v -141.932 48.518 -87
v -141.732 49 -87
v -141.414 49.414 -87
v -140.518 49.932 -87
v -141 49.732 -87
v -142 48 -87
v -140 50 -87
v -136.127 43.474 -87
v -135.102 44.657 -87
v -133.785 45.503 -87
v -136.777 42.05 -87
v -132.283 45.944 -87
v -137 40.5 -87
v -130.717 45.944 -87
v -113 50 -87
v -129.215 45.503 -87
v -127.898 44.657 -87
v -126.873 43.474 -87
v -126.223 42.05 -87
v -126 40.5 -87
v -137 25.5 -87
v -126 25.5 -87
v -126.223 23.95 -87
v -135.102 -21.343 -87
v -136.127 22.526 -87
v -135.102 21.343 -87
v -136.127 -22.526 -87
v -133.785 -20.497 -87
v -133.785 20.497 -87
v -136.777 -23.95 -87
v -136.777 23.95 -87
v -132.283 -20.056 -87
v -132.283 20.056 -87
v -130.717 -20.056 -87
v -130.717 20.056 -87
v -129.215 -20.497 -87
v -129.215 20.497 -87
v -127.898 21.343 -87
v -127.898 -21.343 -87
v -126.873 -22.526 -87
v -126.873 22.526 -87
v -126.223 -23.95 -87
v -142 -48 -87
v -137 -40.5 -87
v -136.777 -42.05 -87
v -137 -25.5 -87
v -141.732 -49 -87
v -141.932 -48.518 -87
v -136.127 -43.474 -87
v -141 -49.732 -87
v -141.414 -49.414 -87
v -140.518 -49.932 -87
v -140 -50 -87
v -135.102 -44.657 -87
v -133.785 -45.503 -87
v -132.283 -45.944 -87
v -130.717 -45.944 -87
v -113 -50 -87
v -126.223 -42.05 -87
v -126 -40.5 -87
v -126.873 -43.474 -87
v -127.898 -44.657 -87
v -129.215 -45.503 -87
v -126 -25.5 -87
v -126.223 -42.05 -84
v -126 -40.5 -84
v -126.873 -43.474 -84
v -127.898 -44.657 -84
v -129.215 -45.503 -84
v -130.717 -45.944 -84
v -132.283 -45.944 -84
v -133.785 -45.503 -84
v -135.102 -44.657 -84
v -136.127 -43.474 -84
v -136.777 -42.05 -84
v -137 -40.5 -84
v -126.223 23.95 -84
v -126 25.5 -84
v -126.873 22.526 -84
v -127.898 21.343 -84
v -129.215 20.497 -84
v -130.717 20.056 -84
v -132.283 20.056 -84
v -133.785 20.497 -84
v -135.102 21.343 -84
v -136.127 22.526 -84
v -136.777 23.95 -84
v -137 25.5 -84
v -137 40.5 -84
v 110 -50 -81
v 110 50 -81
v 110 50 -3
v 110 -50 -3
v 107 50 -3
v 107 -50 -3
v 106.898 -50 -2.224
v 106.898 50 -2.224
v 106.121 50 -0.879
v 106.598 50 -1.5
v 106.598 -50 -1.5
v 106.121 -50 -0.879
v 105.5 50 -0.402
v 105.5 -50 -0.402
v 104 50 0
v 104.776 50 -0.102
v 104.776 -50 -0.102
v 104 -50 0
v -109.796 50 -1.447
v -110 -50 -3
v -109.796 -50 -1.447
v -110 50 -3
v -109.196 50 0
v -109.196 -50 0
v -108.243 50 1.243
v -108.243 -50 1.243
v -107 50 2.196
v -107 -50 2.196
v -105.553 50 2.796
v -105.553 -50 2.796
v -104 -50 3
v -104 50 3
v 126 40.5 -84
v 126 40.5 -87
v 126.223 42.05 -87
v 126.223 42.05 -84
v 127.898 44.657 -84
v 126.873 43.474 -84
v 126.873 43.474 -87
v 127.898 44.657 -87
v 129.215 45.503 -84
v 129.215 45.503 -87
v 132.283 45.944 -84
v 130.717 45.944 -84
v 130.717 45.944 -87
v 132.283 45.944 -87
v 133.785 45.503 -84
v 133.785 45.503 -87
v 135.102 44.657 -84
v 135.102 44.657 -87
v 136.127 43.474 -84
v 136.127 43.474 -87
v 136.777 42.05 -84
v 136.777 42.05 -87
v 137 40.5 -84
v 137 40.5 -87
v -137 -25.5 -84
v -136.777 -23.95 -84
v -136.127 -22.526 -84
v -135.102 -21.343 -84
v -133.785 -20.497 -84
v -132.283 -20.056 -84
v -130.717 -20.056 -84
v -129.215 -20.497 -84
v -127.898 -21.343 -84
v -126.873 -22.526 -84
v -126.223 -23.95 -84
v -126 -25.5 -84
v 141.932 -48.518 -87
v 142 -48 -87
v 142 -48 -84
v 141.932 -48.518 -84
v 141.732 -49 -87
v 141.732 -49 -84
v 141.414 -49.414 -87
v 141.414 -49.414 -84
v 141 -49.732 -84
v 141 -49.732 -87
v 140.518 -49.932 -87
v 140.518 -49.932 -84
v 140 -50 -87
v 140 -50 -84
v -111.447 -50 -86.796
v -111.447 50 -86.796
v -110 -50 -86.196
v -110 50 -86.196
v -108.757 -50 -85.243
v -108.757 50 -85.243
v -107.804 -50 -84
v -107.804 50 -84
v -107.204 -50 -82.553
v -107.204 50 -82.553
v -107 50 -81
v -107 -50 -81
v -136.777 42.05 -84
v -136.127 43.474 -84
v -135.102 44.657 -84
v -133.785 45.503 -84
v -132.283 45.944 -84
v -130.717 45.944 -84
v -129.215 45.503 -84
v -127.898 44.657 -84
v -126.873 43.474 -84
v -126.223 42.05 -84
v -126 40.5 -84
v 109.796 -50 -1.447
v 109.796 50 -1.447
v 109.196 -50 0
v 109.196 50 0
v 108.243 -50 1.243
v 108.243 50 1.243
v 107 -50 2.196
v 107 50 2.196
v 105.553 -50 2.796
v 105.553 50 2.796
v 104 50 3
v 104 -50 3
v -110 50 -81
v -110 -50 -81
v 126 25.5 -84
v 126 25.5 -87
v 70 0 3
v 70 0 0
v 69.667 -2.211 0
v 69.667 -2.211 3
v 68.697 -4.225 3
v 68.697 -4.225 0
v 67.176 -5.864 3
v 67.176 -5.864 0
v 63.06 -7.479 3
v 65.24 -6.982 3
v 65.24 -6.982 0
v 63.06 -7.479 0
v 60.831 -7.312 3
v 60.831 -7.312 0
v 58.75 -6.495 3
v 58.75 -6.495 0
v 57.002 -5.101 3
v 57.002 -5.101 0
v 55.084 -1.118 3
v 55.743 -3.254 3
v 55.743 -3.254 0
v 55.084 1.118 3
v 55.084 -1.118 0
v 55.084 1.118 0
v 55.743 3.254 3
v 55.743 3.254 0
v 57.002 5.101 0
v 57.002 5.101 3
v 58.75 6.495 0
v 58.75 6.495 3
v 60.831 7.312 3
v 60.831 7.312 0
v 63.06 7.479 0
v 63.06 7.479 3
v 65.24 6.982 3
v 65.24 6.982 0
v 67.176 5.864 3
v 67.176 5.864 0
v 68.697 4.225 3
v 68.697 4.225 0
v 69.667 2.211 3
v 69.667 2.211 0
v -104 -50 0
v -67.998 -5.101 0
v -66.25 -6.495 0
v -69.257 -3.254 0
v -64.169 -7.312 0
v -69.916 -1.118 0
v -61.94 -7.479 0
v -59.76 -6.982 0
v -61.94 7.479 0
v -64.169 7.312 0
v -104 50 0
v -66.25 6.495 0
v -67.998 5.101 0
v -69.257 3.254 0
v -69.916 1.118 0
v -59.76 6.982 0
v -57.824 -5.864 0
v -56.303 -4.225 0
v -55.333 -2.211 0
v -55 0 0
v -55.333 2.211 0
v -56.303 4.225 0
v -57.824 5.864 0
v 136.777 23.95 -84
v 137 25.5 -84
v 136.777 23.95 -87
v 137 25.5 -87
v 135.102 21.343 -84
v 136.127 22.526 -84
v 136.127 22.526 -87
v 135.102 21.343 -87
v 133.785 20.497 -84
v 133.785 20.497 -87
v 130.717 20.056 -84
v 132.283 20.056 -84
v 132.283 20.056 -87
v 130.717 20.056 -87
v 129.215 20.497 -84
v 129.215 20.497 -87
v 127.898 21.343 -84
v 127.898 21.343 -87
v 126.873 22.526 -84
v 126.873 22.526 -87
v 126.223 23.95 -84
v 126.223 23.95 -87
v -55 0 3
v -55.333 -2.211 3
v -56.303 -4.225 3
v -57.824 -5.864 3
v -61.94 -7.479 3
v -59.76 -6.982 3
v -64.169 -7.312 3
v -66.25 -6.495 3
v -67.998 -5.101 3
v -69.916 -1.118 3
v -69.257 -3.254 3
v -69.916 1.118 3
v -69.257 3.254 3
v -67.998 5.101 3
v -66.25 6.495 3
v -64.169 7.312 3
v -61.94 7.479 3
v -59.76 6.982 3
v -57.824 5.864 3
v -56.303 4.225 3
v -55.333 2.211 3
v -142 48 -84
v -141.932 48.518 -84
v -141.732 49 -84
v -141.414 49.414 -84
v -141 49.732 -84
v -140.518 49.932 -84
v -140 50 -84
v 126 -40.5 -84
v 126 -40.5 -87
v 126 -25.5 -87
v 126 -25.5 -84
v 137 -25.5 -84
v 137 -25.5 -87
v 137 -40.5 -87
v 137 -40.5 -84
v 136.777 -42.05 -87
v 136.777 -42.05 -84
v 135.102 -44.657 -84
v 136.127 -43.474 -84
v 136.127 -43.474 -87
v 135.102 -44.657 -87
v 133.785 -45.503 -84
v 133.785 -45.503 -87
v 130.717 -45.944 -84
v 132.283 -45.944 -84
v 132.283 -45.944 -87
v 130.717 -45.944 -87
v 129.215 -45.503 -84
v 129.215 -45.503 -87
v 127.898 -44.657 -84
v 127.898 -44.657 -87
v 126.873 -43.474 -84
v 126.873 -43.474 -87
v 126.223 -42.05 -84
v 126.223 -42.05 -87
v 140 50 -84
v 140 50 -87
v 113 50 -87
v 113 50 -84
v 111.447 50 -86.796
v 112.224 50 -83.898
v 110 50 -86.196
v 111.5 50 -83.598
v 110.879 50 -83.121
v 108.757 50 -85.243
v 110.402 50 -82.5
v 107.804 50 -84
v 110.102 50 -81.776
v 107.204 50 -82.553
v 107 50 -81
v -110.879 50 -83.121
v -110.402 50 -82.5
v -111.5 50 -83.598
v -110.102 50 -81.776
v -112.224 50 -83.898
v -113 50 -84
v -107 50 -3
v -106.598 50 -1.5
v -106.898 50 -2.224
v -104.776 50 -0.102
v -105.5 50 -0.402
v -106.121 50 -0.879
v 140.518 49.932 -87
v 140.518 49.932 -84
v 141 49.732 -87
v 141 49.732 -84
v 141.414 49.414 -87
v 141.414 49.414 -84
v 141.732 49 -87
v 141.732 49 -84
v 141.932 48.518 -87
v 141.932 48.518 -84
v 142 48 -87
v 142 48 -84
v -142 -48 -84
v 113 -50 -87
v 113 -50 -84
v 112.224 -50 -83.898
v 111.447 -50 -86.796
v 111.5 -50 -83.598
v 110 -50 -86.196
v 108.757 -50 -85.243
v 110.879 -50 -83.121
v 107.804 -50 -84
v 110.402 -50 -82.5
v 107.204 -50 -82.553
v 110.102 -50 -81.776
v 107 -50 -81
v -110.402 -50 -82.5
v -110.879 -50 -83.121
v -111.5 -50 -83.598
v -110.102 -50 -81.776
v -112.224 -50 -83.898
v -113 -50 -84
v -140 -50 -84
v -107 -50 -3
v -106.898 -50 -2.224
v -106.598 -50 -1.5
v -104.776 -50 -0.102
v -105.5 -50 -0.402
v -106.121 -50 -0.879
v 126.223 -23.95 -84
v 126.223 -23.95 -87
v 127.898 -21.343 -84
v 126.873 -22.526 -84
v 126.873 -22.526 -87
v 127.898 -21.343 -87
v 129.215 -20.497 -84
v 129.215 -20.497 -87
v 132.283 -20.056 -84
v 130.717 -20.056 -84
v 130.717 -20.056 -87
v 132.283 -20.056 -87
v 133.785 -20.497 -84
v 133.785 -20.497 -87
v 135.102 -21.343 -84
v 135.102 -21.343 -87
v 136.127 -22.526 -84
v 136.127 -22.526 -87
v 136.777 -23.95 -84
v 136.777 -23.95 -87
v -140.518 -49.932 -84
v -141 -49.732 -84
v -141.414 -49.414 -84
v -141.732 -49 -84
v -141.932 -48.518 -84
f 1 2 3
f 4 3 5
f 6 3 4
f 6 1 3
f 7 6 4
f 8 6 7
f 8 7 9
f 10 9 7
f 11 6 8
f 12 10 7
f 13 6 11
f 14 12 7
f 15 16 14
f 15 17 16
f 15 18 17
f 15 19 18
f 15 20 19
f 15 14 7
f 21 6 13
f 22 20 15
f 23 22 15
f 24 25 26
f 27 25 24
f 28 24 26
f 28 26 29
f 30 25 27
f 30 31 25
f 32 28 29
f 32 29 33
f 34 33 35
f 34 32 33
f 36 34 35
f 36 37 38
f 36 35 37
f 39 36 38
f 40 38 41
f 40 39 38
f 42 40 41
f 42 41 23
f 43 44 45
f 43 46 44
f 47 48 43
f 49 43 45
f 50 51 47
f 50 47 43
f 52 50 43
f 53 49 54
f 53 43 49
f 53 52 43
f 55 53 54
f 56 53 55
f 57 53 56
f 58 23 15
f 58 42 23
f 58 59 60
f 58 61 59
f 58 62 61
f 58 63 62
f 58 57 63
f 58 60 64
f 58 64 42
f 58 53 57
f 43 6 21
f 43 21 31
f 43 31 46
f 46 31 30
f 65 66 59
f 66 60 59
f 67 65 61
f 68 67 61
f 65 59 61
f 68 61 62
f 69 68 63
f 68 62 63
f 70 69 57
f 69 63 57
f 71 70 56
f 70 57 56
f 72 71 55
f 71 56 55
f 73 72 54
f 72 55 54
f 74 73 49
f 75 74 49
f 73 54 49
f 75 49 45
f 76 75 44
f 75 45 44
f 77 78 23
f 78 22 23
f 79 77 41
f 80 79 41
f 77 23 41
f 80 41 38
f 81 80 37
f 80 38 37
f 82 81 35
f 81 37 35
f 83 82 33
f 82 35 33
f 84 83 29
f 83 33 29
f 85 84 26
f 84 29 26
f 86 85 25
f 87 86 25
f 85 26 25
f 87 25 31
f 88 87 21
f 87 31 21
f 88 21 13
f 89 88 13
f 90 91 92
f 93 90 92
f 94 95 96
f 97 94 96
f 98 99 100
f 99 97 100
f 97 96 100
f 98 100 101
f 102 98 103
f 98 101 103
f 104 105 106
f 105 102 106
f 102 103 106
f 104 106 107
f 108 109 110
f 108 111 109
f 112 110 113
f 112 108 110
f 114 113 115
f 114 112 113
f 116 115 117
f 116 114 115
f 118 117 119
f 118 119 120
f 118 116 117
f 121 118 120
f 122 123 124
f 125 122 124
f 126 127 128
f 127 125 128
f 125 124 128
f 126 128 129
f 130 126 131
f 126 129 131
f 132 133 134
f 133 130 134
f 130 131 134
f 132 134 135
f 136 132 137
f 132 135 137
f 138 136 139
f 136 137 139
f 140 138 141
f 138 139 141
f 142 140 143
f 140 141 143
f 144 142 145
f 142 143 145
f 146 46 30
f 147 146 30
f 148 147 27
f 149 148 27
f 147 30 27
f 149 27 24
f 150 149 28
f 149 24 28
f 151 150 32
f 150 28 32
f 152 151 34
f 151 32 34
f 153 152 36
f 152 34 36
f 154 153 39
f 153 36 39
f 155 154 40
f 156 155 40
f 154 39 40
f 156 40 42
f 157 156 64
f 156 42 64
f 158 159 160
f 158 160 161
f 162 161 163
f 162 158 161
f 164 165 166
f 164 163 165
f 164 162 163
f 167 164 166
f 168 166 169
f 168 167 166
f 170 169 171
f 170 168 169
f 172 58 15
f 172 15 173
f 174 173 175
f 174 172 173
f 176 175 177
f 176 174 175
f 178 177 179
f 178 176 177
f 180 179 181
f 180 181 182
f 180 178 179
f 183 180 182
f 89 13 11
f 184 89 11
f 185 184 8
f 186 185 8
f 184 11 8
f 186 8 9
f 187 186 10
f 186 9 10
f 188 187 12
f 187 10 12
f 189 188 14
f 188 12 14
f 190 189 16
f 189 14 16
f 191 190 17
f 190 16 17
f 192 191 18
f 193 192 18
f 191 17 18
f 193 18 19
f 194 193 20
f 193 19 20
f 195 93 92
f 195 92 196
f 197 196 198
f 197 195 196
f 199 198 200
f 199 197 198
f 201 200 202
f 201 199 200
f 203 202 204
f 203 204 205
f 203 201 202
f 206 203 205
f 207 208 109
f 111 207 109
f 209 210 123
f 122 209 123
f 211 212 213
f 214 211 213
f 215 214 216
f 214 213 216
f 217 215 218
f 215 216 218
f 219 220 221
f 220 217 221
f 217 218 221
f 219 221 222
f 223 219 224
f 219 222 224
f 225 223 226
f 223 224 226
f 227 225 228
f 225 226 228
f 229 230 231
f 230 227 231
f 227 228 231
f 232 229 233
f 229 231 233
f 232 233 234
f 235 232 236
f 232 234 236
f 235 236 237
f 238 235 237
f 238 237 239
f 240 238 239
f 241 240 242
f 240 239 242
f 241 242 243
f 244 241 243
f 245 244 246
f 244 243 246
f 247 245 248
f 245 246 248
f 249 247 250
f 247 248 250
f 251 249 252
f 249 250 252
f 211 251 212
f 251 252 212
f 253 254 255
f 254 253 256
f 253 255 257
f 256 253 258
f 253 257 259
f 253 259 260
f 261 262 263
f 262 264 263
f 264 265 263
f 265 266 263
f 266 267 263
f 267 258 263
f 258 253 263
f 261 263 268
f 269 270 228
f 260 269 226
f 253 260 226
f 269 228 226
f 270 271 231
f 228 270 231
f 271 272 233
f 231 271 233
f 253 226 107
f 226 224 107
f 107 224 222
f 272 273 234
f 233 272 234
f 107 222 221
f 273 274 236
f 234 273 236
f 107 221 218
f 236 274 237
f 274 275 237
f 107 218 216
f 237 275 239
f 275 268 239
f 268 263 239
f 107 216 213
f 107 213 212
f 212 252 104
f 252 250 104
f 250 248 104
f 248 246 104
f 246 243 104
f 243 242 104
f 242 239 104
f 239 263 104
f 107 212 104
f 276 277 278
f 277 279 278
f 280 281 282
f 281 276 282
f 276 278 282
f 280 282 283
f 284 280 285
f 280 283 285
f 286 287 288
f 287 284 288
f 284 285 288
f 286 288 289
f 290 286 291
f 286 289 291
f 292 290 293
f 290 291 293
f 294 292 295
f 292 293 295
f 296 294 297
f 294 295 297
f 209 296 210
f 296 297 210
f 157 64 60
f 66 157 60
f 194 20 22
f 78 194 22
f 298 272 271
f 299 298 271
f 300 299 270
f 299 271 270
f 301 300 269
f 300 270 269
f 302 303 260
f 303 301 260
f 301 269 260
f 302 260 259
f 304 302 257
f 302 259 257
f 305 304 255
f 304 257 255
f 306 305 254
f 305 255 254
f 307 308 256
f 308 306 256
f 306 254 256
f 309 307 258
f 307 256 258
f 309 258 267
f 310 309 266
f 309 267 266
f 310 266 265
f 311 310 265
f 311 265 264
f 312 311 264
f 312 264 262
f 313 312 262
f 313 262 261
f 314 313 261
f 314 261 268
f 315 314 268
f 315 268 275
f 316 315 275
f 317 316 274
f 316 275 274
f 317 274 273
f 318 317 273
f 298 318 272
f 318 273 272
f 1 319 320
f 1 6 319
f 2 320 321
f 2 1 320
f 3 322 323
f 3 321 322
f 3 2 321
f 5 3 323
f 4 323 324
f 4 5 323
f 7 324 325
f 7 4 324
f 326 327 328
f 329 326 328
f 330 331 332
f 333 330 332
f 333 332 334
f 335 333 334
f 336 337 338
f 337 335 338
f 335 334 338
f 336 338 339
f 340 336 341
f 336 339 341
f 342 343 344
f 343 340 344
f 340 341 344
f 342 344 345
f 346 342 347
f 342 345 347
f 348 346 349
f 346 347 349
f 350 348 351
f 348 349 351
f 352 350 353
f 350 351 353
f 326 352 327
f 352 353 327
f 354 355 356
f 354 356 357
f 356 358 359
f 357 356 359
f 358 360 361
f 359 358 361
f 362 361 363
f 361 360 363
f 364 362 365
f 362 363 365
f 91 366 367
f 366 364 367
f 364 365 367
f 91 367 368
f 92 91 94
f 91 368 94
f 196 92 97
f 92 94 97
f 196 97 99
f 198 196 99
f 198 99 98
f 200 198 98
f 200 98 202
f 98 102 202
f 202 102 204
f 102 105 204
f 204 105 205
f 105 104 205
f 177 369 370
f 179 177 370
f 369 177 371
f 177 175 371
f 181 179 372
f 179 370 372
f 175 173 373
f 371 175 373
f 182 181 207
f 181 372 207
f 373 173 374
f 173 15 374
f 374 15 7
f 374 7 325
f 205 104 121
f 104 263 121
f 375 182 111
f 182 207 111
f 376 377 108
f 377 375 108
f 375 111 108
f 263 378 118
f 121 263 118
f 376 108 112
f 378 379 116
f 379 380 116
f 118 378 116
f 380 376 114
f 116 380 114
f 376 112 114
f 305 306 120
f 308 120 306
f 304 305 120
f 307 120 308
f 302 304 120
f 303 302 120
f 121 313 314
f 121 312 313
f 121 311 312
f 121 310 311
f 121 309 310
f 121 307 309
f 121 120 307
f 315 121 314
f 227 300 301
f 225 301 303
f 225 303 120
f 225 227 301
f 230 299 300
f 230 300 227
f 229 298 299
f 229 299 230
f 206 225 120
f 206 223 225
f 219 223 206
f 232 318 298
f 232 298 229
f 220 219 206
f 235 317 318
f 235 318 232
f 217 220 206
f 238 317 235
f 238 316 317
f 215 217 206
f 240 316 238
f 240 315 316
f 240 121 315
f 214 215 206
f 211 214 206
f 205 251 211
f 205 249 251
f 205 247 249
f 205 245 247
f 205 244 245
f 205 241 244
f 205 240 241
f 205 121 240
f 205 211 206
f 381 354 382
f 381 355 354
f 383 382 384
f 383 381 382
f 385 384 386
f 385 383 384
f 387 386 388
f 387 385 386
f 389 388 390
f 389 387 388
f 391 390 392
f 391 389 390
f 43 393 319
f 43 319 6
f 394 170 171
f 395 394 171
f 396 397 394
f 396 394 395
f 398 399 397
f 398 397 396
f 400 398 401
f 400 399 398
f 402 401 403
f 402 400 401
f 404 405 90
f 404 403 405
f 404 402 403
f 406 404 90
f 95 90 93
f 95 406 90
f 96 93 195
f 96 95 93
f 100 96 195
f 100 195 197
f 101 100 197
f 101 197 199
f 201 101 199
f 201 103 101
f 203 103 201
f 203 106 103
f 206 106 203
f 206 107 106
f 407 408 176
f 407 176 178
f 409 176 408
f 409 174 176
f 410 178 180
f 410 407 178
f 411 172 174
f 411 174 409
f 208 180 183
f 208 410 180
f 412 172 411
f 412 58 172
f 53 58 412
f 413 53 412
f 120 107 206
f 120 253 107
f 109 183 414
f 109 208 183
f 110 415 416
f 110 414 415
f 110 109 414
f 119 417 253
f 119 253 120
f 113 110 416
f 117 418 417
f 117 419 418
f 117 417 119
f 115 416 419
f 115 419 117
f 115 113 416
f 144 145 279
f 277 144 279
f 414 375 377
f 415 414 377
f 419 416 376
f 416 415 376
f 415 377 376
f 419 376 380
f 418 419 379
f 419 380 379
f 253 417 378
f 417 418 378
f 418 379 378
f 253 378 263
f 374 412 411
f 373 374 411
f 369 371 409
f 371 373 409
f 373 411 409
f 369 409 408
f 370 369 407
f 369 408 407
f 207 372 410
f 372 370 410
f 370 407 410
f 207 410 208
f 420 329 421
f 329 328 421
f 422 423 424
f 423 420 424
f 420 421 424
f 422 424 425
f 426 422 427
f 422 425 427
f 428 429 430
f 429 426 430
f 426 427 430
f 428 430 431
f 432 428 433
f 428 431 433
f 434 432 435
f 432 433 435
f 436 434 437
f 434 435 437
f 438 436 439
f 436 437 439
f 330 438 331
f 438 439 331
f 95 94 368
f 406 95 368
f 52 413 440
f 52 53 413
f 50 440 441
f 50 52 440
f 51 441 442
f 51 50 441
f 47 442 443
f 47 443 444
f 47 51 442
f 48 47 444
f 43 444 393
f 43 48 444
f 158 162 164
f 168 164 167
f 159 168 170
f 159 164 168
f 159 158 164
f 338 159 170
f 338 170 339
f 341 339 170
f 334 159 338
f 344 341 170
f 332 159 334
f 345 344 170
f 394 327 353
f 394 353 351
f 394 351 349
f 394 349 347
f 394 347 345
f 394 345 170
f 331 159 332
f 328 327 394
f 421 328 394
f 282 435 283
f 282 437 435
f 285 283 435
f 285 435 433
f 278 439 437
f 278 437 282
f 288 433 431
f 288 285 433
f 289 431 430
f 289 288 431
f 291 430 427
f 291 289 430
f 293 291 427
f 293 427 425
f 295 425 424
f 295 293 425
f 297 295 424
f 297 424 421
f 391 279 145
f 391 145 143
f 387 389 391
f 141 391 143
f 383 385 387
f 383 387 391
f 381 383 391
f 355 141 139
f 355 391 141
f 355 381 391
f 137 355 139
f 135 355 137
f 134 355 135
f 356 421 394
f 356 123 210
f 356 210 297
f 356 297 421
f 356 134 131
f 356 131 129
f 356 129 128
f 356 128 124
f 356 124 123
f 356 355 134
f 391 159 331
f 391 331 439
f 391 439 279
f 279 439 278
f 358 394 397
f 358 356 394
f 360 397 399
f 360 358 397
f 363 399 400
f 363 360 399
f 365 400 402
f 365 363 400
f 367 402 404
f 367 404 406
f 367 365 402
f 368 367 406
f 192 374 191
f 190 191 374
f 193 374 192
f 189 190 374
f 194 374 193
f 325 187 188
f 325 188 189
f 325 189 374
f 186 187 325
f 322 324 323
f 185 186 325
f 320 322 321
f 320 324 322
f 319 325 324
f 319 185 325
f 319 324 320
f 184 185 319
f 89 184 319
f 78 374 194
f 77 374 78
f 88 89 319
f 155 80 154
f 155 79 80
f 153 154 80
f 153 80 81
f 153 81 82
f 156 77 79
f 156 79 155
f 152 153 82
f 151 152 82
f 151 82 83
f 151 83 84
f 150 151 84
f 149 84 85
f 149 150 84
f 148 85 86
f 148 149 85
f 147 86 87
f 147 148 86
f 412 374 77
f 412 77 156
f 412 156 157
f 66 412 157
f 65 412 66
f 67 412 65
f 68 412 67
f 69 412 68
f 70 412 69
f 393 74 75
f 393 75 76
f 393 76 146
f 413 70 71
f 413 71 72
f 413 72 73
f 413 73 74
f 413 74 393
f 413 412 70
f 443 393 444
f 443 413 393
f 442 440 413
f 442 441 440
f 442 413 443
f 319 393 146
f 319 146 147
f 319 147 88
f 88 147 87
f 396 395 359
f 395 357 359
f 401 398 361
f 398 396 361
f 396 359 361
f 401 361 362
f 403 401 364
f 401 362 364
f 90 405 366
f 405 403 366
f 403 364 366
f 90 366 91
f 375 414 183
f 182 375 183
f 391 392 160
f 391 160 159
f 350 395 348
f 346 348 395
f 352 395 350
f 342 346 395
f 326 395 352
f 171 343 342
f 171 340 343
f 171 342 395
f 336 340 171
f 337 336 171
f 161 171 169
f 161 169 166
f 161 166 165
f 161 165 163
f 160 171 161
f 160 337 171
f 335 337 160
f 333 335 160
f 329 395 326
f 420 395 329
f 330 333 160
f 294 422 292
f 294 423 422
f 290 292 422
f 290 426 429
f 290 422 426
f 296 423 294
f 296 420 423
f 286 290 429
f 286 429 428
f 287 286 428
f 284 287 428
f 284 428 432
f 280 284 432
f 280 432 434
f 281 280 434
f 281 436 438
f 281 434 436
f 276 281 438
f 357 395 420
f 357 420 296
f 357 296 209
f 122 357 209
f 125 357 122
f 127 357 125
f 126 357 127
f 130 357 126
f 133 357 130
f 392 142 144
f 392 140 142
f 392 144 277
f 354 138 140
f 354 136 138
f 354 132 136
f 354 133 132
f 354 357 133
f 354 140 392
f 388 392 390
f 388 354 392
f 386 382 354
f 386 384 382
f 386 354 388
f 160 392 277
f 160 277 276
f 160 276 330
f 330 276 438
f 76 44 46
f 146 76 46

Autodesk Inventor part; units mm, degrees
ref_plane "YZ Plane" through (0, 0, 0) normal (1, 0, 0) x (0, 1, 0)
ref_plane "XZ Plane" through (0, 0, 0) normal (0, 1, 0) x (-1, 0, 0)
ref_plane "XY Plane" through (0, 0, 0) normal (0, 0, 1) x (1, 0, 0)
sketch "Sketch1" plane through (0, 0, 0) normal (0, 0, 1) x (1, 0, 0)
  line L0 (-110, -50) -> (110, -50)
  line L1 (110, -50) -> (110, 50)
  line L2 (110, 50) -> (-110, 50)
  line L3 (-110, 50) -> (-110, -50)
  line L4 (-110, -50) -> (110, 50) construction
  circle A0 centre (-62.5, 0) radius 7.5
  circle A1 centre (62.5, 0) radius 7.5
  line L5 (0, 50) -> (0, -50) construction
  line L6 (-110, 0) -> (110, 0) construction
  line L7 (-70, 0) -> (-55, 0) construction
  point P0 (0, 0)
  dimension "d154" = 220
  dimension "d155" = 100
  dimension "d159" = 15
  dimension "d160" = 125
  dimension "d190" = 15
extrude "Plate5" add sketch "Sketch1" along normal blind 3
sketch "Sketch7" plane through (-107, 50, 3) normal (-1, 0, 0) x (0, -1, 0)
  line L0 (100, 0) -> (0, 0)
  line L1 (0, 0) -> (0, -90)
  line L2 (0, -90) -> (100, -90)
  line L3 (100, -90) -> (100, 0)
edge flange "Flange3" height 90 angle 90 thickness 3 bend radius 3 thickness toward (-1, 0, 0) relief tear relief width 3 relief depth 1.5 corner gap 3 corner form 0 edges at (-110, 0, 0) (110, 0, 0) wall of the first edge with corners at (-107, -50, 3) (-107, 50, 3) (-107, 50, -87) (-107, -50, -87)
bend "Bend3"
corner "Corner3"
sketch "Sketch8" plane through (-107, -50, -84) normal (0, 0, -1) x (-1, 0, 0)
  line L0 (0, 100) -> (0, 0)
  line L1 (0, 0) -> (35, 0)
  line L2 (35, 0) -> (35, 100)
  line L3 (35, 100) -> (0, 100)
edge flange "Flange4" height 35 angle 90 thickness 3 bend radius 3 thickness toward (0, 0, -1) relief tear relief width 3 relief depth 1.5 corner gap 3 corner form 0 edges at (-110, 0, -87) (110, 0, -87) wall of the first edge with corners at (-107, 50, -84) (-107, -50, -84) (-142, -50, -84) (-142, 50, -84)
bend "Bend4"
corner "Corner4"
sketch "Sketch9" plane through (-142, -50, -87) normal (0, 0, -1) x (-1, 0, 0)
  line L0 (-10.5, 9.5) -> (-10.5, 24.5) construction
  line L1 (-5, 9.5) -> (-5, 24.5)
  line L2 (-16, 24.5) -> (-16, 9.5)
  arc A0 (-16, 9.5) -> (-5, 9.5) centre (-10.5, 9.5) ccw
  arc A1 (-5, 24.5) -> (-16, 24.5) centre (-10.5, 24.5) ccw
  line L3 (-10.5, 75.5) -> (-10.5, 90.5) construction
  line L4 (-5, 75.5) -> (-5, 90.5)
  line L5 (-16, 90.5) -> (-16, 75.5)
  arc A2 (-16, 75.5) -> (-5, 75.5) centre (-10.5, 75.5) ccw
  arc A3 (-5, 90.5) -> (-16, 90.5) centre (-10.5, 90.5) ccw
  line L6 (0, 100) -> (0, 0) projected
  line L7 (0, 50) -> (-19.5858, 50)
  point P0 (-142, 50)
  point P1 (-10.5, 17)
  point P2 (-10.5, 83)
  point P3 (-10.5, 30)
  point P4 (-10.5, 70)
  dimension "d182" = 11
  dimension "d183" = 15
  dimension "d184" = 5
  dimension "d186" = 40
extrude "Cut1" cut sketch "Sketch9" against normal blind 3
mirror "Mirror1" about plane through (0, 0, 0) normal (1, 0, 0) of "Cut1"
fillet "Corner Round2" radius 2 4 edges at (-142, 50, -85.5) (-142, -50, -85.5) (142, -50, -85.5) (142, 50, -85.5)
properties part number "DMF Подставка ркдуктор_CPY"
